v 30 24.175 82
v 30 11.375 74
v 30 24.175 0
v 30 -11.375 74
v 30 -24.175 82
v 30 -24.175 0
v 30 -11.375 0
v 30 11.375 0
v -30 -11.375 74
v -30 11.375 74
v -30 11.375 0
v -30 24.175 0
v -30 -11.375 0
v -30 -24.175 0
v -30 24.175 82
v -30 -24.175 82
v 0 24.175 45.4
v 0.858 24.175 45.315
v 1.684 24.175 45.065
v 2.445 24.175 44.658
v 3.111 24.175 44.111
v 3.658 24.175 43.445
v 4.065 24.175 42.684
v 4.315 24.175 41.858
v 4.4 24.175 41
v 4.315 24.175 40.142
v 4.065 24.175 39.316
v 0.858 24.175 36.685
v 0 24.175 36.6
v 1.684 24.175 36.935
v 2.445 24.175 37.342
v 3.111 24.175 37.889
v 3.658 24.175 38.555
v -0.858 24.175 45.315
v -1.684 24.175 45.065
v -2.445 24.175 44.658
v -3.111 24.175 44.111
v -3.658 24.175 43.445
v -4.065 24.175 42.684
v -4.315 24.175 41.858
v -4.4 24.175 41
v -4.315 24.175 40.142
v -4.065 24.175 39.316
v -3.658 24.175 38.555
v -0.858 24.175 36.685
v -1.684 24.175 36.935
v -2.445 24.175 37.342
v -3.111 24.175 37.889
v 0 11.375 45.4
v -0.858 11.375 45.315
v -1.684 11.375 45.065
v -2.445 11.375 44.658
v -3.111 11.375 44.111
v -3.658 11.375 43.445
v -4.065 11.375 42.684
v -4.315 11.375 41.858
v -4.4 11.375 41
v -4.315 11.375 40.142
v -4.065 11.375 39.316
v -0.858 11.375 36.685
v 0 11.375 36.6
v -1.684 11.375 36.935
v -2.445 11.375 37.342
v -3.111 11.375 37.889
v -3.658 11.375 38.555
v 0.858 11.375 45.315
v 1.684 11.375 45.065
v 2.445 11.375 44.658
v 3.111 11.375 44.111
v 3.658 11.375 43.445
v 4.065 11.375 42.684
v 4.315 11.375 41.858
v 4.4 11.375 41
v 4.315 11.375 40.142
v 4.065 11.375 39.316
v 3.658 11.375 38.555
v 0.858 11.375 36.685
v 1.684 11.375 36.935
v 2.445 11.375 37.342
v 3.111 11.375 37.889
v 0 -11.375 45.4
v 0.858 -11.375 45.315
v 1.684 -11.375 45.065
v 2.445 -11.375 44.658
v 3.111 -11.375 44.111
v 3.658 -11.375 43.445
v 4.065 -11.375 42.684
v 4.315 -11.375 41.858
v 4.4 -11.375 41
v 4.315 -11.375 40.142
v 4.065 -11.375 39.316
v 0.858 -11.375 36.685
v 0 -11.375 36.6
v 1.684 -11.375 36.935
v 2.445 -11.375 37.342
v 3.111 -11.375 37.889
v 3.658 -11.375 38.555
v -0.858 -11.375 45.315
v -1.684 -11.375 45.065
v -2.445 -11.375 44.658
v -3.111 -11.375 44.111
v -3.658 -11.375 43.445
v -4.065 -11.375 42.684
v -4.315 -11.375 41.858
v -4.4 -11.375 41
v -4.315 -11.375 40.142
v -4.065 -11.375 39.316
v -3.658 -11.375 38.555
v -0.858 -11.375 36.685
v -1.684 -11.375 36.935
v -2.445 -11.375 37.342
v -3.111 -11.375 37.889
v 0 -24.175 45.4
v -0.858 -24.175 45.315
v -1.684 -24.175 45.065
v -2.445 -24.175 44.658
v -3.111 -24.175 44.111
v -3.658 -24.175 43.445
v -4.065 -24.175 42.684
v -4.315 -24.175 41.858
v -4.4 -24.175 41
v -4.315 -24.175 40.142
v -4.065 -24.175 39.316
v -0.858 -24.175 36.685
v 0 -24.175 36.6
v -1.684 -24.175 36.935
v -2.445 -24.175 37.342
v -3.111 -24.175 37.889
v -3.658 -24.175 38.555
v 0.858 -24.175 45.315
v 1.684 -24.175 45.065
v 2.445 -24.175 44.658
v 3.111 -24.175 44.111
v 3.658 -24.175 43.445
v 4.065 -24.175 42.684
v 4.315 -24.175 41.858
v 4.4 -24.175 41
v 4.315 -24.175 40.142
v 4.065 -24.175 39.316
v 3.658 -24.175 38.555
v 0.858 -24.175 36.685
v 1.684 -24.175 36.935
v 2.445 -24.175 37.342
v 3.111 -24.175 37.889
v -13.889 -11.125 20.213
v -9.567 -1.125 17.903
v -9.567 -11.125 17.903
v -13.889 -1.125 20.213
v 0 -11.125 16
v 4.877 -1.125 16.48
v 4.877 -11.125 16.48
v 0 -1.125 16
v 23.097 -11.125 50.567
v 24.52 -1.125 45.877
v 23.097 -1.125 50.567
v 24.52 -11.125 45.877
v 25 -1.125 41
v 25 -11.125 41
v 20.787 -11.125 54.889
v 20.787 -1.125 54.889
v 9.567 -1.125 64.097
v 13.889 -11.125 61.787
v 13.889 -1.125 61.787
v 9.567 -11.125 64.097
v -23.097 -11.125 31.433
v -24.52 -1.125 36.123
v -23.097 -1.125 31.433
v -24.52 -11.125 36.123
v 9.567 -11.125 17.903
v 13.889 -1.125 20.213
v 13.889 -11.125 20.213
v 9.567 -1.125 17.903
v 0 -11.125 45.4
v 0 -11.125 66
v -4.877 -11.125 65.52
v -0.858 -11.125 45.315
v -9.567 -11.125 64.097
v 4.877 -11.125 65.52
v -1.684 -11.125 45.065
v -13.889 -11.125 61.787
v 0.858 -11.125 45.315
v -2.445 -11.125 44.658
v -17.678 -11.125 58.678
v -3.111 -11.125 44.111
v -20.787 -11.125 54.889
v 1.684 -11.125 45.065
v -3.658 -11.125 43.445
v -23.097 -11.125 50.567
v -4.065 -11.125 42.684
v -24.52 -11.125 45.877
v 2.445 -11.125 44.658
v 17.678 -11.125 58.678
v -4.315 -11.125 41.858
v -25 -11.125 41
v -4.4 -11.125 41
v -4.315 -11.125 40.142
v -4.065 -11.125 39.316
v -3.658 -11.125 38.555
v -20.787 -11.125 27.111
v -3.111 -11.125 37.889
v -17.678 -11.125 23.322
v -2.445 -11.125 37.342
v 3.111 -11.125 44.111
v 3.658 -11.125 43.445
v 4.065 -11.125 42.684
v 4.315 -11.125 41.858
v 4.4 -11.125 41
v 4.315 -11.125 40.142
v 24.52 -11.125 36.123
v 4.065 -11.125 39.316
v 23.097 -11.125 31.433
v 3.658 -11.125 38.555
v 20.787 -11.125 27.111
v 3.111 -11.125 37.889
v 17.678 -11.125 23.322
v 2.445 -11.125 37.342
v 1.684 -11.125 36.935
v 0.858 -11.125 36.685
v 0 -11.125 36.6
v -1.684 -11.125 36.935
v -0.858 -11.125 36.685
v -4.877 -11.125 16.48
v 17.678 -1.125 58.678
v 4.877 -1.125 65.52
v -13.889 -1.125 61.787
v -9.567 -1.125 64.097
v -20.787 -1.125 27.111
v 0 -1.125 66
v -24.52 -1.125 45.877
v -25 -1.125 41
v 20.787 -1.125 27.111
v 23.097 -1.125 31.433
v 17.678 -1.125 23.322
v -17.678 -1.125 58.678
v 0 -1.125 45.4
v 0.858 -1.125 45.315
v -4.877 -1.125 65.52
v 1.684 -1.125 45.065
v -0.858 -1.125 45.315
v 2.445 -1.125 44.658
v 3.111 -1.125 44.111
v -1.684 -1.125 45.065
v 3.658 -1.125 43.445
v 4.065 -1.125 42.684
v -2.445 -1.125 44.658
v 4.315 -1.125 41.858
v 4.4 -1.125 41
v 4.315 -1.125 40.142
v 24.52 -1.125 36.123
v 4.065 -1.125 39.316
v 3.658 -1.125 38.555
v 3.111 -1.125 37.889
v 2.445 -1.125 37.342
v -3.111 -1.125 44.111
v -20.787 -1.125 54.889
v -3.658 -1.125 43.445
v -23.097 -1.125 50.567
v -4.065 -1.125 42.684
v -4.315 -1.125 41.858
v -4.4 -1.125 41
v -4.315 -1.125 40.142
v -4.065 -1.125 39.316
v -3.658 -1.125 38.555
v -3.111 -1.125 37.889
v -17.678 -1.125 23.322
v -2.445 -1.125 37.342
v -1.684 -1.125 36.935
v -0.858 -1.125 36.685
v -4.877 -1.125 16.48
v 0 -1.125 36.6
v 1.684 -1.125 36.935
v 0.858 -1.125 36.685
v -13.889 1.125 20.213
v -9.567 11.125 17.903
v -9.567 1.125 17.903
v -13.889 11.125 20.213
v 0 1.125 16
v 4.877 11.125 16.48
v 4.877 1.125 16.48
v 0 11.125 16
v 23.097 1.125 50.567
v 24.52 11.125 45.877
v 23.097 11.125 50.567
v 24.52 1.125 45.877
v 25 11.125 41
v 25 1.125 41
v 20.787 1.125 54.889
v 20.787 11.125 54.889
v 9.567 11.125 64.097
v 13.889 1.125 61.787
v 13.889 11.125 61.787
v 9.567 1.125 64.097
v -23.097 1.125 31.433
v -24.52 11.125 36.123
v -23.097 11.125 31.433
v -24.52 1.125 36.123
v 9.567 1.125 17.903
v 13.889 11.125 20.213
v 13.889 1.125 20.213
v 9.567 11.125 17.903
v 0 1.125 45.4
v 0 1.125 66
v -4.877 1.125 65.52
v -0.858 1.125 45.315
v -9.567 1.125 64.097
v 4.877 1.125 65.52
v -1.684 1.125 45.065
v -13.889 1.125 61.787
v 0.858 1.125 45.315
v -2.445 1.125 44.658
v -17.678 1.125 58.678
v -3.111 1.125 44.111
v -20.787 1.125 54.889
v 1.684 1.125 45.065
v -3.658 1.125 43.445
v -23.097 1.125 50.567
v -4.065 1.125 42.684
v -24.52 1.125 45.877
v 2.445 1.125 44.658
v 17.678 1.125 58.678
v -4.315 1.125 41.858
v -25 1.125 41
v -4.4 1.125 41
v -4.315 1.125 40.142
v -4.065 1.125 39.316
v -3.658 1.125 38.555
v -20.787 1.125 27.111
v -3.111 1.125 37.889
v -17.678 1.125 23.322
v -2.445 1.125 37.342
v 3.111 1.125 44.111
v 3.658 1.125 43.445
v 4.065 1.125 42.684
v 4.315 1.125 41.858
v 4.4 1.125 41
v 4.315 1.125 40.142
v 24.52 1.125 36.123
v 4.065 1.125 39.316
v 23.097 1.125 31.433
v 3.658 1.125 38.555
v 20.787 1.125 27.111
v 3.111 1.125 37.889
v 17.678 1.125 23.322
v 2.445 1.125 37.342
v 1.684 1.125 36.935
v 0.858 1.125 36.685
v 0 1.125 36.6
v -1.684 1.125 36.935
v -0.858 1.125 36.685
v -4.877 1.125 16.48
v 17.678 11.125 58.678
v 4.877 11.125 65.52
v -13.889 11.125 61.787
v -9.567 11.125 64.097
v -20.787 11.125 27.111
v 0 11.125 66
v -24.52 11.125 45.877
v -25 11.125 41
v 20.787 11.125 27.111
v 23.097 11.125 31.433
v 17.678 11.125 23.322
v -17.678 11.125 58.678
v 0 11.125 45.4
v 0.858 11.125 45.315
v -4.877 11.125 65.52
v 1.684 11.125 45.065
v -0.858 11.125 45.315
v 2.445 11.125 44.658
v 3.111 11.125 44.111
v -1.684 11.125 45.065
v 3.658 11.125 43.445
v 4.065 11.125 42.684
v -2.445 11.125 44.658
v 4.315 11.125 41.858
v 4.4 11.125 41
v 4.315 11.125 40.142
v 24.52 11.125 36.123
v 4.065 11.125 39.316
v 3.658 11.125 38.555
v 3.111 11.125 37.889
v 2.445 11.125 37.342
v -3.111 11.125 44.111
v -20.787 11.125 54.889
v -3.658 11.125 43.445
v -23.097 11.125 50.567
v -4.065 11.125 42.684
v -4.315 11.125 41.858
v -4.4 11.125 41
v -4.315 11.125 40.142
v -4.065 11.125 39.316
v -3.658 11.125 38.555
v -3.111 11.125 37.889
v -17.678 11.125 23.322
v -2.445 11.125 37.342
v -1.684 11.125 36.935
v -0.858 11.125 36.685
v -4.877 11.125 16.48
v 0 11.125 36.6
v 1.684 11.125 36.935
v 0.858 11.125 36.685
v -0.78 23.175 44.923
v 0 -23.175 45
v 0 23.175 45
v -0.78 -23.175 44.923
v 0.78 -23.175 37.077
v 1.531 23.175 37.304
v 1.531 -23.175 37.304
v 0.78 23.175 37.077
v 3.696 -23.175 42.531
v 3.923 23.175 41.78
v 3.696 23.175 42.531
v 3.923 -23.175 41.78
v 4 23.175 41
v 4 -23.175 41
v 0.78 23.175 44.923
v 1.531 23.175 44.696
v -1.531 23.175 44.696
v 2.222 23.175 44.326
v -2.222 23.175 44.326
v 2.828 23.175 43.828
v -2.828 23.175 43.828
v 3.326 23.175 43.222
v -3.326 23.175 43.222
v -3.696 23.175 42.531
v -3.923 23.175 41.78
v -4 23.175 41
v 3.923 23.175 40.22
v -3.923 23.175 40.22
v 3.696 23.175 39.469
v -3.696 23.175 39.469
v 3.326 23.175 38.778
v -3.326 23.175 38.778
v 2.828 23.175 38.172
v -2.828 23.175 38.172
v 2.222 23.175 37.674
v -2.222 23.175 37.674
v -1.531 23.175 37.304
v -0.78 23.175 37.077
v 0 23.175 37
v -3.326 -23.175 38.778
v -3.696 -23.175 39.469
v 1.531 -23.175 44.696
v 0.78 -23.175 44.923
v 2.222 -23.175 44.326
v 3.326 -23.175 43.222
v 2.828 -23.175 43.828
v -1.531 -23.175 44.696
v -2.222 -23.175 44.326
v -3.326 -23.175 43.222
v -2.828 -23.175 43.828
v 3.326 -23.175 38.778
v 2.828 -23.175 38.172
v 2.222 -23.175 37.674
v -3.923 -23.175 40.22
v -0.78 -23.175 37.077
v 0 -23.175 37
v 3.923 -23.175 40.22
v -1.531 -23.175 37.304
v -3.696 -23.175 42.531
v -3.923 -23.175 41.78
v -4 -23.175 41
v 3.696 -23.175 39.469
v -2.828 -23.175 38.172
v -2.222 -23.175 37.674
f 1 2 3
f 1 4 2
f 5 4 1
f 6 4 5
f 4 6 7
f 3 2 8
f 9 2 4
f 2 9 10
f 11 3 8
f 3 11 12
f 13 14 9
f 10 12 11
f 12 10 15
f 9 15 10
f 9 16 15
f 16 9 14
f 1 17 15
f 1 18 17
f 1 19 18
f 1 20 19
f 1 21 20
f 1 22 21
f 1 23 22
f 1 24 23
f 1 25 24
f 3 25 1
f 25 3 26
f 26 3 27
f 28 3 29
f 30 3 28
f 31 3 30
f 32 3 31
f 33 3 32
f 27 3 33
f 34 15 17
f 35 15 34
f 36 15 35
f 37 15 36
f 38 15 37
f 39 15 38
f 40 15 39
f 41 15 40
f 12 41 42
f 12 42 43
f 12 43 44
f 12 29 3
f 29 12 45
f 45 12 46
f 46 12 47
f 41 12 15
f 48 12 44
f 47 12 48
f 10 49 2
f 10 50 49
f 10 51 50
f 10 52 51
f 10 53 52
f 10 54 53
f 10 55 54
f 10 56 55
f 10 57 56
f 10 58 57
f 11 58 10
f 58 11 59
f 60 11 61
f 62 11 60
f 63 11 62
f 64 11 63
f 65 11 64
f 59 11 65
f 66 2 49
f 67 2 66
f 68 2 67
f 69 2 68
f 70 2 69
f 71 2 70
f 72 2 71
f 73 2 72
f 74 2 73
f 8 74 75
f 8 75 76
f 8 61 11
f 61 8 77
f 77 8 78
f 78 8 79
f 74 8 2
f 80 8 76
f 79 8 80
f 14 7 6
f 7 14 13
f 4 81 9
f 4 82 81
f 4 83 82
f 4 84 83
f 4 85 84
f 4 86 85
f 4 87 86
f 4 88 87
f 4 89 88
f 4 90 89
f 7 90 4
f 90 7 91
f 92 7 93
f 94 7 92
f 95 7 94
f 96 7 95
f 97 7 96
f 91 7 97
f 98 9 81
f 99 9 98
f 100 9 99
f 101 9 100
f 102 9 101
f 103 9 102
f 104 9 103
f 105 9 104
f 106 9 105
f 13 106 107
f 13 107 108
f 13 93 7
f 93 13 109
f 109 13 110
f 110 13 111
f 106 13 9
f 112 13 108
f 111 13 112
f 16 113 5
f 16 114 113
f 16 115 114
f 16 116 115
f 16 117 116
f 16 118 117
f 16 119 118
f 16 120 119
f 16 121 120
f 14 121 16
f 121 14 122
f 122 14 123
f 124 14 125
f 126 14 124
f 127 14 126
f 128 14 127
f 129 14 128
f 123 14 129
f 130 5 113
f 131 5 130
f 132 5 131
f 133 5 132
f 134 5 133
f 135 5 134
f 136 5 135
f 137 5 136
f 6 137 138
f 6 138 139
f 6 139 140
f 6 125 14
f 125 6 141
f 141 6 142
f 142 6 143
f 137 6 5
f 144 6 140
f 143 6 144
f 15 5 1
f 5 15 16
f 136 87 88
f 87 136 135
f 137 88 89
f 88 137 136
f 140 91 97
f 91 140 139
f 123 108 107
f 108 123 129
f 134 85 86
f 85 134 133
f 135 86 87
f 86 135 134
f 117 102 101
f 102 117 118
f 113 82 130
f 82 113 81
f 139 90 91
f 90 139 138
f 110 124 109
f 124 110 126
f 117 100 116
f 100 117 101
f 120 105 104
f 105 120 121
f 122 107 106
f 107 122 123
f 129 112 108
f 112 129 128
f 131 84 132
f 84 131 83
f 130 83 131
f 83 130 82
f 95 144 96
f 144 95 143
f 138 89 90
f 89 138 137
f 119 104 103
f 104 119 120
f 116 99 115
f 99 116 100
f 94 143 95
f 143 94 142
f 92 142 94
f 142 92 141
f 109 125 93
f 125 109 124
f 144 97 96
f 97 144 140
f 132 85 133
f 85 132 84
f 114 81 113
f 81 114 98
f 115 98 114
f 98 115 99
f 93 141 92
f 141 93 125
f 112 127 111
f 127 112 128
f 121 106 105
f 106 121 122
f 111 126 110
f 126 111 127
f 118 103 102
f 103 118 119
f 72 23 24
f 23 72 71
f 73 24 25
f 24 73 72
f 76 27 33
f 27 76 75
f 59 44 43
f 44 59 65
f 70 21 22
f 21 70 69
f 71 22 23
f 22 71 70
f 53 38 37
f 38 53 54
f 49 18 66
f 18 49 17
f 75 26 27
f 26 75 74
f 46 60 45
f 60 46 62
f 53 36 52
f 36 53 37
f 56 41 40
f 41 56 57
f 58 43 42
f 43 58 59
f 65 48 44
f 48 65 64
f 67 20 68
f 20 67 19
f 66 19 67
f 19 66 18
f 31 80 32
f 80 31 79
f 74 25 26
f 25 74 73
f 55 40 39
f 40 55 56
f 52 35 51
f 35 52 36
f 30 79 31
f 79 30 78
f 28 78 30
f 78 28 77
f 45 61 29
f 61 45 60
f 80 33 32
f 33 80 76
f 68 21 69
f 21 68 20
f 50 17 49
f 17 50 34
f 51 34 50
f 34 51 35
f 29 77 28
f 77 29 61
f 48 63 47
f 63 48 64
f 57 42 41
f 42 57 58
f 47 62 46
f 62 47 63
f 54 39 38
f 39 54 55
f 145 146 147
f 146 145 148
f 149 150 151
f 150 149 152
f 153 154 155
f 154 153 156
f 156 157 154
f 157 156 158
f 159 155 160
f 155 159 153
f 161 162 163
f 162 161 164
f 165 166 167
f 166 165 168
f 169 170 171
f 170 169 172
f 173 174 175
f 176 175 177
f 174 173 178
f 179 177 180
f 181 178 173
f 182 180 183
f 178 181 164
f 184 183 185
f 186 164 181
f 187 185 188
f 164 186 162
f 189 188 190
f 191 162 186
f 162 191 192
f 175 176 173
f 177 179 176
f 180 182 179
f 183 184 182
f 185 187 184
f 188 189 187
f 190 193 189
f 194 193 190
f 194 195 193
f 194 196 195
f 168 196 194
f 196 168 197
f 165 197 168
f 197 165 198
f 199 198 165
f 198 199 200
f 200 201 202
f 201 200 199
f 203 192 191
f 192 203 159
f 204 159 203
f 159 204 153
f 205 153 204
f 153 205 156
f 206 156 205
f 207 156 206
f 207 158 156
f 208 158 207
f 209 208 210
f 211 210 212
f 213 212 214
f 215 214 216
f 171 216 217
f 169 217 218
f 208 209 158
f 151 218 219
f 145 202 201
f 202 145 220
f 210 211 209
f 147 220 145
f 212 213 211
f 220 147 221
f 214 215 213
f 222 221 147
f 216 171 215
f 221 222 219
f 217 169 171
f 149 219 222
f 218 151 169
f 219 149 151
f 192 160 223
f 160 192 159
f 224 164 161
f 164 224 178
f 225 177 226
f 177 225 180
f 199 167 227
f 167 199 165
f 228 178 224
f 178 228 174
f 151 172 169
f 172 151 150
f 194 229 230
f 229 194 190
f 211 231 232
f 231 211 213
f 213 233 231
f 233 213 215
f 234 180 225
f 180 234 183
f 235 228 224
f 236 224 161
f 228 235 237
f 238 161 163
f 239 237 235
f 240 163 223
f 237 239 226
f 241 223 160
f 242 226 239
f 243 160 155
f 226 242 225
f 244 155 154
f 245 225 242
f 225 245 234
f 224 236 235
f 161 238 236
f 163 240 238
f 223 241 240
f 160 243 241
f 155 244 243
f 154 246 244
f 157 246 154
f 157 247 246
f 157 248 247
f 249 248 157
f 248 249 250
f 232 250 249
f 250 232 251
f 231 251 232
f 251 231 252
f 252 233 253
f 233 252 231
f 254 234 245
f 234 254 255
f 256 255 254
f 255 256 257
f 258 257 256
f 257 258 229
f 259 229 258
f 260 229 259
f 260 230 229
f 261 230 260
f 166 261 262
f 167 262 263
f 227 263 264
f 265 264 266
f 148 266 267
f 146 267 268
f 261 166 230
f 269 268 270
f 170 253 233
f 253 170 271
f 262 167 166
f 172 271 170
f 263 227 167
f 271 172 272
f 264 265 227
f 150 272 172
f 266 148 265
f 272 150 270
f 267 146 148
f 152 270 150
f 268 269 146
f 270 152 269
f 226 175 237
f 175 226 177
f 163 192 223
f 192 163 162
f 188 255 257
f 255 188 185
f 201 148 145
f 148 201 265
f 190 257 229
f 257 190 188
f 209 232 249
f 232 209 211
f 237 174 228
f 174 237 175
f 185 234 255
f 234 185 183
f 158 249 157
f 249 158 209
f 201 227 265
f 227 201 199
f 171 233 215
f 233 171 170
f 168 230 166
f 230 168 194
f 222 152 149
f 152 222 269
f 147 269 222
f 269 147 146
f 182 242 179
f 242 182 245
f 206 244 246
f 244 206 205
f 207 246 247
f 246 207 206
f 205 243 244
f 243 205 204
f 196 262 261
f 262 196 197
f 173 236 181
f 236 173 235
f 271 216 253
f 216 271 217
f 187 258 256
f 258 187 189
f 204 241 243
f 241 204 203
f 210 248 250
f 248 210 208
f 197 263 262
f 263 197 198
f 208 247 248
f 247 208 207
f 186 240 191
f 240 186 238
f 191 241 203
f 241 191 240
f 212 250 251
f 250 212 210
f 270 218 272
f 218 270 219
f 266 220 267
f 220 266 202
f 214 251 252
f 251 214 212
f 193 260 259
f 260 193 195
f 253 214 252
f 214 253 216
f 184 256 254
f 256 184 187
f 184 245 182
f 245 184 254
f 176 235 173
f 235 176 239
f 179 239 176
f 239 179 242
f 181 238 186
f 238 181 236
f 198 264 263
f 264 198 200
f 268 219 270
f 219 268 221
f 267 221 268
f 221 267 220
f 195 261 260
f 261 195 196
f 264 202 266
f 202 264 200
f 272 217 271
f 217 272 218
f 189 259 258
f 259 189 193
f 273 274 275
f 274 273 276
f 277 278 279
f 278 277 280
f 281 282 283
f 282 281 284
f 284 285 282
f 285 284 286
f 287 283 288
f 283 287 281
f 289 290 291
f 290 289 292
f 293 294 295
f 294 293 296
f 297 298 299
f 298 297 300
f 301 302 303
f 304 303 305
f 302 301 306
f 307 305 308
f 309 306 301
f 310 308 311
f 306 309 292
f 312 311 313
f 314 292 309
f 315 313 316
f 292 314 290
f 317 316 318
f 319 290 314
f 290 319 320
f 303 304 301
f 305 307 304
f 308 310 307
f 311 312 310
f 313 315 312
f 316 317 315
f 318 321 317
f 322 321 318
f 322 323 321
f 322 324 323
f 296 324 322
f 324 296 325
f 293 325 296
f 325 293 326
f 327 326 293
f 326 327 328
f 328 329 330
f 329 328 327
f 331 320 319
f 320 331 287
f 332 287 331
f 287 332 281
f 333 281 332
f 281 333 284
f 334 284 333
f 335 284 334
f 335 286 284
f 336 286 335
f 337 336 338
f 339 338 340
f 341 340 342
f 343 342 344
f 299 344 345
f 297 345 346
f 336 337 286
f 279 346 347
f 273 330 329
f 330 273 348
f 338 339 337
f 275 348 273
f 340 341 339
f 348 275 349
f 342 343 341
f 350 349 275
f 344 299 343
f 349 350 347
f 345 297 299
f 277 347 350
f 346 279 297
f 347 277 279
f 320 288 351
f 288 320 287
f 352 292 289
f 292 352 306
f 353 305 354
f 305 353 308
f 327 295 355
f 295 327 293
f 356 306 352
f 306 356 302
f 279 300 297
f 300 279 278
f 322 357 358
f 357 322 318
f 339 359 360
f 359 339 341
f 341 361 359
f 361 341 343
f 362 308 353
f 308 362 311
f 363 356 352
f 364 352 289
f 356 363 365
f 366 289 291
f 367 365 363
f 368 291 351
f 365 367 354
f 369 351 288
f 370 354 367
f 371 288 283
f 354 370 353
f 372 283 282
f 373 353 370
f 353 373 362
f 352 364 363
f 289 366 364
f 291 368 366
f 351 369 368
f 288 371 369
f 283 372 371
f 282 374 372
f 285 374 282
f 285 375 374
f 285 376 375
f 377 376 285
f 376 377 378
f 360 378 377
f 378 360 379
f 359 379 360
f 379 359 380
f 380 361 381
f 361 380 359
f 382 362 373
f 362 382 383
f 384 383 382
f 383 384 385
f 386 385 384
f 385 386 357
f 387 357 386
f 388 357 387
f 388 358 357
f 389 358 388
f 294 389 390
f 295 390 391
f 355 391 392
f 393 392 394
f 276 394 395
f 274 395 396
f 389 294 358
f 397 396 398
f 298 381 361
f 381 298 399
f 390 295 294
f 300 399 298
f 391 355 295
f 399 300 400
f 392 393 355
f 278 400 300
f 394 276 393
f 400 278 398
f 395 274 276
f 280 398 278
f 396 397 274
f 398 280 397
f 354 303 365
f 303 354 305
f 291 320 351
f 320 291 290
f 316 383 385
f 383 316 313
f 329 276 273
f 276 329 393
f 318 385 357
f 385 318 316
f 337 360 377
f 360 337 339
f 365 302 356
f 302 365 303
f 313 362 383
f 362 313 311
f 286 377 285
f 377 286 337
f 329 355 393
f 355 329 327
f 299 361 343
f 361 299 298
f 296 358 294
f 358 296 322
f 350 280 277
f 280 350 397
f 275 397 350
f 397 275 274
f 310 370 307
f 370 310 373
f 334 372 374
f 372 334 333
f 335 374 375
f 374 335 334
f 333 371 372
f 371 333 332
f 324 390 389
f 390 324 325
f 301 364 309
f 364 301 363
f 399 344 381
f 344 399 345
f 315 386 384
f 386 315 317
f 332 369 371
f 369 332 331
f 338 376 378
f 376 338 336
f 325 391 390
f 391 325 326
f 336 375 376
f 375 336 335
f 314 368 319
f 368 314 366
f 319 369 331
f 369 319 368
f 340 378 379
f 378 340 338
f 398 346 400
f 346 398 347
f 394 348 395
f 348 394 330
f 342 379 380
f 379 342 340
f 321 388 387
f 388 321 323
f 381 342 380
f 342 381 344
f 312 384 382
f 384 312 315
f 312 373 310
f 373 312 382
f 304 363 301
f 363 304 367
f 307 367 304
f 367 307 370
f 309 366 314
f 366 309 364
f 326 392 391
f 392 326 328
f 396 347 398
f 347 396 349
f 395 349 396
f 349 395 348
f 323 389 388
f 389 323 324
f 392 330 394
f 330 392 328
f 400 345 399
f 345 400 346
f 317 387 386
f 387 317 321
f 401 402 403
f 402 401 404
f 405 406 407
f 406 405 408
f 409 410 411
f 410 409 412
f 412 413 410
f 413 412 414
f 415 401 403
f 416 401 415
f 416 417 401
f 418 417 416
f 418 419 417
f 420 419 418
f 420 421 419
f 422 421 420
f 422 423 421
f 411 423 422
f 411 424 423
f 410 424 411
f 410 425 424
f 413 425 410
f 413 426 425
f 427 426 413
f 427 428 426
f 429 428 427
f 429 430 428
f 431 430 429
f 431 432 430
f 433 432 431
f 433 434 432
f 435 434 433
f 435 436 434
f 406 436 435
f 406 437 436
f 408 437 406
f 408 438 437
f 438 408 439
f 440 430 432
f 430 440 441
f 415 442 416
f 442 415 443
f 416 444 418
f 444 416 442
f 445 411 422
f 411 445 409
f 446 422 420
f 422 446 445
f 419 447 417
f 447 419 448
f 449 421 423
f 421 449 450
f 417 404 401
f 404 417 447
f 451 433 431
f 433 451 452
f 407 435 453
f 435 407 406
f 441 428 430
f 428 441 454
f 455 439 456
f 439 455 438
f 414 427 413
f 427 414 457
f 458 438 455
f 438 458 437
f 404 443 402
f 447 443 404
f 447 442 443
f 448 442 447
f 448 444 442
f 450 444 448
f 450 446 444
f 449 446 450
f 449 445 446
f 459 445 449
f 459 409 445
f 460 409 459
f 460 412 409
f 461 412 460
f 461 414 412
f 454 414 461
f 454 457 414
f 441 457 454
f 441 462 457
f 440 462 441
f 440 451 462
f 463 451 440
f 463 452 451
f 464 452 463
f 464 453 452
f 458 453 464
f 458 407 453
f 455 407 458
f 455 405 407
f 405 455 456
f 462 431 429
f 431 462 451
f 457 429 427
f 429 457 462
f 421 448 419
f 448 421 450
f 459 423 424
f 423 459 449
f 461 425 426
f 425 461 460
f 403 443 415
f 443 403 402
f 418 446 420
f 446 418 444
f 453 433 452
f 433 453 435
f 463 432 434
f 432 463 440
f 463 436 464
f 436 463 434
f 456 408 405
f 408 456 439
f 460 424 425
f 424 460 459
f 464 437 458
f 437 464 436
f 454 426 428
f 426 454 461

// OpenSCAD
$fn = 32;

// ------------------------------------------------------------------------
// Trolley wheel set: wheels d50, fork 74 mm tall
// Every part is its own module, assembly() places every instance.
// ------------------------------------------------------------------------

// --- part 1 ---
module trolley_fork() {
  difference() {
    union() {
      translate([-30, 11.375, 0]) cube([60, 12.8, 74]);
      translate([-30, -24.175, 0]) cube([60, 12.8, 74]);
      translate([-30, -24.175, 74]) cube([60, 48.35, 8]);
    }
    translate([0, -17.775, 41]) rotate([90, 0, 0]) cylinder(h = 14.8, d = 8.8, center = true);
    translate([0, 17.775, 41]) rotate([90, 0, 0]) cylinder(h = 14.8, d = 8.8, center = true);
  }
}

// --- part 2 ---
module trolley_wheel() {
  difference() {
      translate([0, 0, 0]) cylinder(h = 10, d = 50);
      translate([0, 0, -1]) cylinder(h = 12, d = 8.8);
    }
}

// --- part 3 ---
module trolley_axle() {
  translate([0, 0, -23.175]) cylinder(h = 46.35, d = 8);
}

// --- assembly ---
module assembly() {
  color([0.80, 0.24, 0.20]) translate([0, 0, 0]) rotate([0, 0, 0]) trolley_fork();
  color([0.20, 0.45, 0.75]) translate([0, -1.125, 41]) rotate([90, 0, 0]) trolley_wheel();
  color([0.25, 0.62, 0.32]) translate([0, 11.125, 41]) rotate([90, 0, 0]) trolley_wheel();
  color([0.92, 0.70, 0.18]) translate([0, 0, 41]) rotate([90, 0, 0]) trolley_axle();
}

assembly();
